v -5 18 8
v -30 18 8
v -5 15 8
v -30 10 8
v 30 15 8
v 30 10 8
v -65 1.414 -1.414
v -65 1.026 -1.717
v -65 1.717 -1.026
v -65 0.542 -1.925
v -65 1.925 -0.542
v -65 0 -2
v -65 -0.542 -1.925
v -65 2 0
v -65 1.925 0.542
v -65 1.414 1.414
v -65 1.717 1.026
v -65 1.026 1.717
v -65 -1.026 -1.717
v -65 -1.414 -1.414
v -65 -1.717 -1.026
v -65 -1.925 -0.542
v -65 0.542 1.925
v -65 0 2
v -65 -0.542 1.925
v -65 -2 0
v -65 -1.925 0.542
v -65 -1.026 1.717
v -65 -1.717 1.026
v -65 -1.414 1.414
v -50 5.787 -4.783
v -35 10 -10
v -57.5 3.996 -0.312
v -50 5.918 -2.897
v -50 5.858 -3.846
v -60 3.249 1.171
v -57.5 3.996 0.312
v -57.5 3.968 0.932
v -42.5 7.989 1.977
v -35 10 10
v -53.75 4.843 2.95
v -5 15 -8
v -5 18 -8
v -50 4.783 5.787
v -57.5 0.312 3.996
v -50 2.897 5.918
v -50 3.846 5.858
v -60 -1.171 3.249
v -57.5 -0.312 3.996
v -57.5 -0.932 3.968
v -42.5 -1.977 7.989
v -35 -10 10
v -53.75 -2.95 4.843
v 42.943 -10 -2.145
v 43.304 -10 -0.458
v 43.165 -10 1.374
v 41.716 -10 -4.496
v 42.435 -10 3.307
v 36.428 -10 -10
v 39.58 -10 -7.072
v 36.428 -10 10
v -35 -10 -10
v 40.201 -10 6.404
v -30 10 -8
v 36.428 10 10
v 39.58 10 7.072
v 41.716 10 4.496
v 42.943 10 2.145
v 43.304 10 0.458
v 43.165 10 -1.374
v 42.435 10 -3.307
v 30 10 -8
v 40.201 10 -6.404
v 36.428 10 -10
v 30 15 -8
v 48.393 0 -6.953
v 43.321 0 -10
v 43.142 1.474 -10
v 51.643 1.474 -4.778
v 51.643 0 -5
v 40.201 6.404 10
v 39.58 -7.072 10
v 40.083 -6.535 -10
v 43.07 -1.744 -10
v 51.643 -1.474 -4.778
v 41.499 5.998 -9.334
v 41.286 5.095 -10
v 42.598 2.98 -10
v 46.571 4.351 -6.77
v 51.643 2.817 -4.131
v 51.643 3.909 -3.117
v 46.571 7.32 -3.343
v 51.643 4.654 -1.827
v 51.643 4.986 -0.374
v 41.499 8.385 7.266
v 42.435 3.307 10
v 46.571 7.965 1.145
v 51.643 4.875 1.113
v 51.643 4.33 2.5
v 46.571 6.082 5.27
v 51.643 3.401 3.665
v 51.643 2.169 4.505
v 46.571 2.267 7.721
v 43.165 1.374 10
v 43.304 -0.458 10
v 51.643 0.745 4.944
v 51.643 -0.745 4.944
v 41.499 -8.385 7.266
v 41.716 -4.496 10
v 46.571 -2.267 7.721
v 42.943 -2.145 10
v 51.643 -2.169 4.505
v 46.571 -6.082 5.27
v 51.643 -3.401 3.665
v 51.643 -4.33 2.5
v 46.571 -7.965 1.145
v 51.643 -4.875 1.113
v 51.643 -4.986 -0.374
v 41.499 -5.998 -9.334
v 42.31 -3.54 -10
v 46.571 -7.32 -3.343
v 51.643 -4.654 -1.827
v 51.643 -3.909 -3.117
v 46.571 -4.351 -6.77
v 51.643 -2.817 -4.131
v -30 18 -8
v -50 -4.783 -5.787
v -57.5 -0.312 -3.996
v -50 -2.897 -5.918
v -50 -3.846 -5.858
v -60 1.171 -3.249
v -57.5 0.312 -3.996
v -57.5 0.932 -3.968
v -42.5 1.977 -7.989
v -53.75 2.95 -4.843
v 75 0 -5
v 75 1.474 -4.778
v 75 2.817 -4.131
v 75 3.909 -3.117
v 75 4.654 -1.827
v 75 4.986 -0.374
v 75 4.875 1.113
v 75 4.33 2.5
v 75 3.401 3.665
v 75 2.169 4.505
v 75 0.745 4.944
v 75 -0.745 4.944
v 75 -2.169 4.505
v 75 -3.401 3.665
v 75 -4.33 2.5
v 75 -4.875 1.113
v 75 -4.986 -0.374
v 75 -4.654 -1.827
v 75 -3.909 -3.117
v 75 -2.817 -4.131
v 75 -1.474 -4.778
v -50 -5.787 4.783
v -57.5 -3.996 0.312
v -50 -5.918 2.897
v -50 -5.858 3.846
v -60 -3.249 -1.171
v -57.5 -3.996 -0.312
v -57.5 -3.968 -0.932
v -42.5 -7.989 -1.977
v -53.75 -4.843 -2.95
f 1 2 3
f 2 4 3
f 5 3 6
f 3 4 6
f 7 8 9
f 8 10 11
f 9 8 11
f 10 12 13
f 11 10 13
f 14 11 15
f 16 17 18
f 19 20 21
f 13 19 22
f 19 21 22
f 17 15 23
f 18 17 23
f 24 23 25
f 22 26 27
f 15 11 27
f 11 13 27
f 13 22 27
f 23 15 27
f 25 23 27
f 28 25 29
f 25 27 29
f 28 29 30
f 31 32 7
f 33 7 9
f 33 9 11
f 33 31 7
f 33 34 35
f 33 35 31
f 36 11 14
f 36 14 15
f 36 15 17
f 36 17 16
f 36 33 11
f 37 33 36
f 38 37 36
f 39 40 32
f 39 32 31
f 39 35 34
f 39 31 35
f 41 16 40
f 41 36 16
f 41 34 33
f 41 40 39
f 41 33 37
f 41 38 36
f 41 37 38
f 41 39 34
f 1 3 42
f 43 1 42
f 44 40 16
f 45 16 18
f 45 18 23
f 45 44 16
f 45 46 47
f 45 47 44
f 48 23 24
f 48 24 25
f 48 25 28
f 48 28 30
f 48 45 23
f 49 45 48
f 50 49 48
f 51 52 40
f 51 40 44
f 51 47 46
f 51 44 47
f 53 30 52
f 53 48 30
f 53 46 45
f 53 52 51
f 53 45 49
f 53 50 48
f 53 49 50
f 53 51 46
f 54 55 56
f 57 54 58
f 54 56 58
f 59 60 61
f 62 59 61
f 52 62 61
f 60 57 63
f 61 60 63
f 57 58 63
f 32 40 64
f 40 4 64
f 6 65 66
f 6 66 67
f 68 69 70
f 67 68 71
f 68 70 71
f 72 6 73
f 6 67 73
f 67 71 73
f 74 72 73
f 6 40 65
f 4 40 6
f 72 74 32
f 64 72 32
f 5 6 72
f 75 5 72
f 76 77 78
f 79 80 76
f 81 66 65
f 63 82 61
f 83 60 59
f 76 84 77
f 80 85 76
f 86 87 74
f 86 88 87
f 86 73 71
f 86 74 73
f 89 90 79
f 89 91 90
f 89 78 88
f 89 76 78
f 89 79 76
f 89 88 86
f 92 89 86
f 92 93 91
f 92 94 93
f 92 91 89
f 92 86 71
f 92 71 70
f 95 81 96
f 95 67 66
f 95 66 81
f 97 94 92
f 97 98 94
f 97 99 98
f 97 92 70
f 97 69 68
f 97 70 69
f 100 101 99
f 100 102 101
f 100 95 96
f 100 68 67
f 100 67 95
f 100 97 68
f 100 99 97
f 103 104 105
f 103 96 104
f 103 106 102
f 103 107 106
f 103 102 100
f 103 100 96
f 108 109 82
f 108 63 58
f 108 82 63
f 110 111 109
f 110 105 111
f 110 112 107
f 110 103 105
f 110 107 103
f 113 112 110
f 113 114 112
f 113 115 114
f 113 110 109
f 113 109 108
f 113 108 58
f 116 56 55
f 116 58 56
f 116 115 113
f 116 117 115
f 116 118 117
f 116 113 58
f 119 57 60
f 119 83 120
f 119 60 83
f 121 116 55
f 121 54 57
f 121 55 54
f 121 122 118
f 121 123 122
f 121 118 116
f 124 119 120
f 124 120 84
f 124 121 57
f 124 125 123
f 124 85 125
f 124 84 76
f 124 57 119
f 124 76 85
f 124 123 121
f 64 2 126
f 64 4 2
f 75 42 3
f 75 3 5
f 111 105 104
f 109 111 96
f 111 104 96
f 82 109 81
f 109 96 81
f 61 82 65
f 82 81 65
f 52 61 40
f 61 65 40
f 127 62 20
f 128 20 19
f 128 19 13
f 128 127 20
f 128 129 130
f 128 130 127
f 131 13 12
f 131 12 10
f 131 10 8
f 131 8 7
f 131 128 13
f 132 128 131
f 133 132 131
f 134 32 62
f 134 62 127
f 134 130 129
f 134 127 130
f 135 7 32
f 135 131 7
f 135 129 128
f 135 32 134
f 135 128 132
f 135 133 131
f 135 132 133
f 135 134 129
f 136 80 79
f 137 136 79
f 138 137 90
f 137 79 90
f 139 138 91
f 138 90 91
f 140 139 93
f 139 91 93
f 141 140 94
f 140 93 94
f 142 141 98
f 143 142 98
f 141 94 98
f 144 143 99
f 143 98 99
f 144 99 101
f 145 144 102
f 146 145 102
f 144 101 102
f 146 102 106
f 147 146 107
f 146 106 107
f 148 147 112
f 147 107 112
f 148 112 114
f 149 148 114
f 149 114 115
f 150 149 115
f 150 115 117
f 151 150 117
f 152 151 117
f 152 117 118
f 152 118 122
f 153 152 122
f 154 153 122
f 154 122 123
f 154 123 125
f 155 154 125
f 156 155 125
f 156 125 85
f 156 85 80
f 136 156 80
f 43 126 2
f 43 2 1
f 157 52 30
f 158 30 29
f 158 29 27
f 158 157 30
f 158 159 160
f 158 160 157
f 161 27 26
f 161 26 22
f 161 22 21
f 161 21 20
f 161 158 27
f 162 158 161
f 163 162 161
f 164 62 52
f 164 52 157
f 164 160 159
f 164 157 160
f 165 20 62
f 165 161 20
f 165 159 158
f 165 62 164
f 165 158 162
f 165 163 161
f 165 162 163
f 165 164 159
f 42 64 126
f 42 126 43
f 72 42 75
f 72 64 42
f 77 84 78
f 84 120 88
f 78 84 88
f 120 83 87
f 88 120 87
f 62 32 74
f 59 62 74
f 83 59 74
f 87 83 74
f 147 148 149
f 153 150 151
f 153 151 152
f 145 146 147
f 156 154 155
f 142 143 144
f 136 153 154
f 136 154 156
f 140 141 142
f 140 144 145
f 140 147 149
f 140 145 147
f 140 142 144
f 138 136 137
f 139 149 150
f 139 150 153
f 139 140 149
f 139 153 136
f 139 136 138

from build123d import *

# Parameters (mm, degrees)
DODANIE_WYCI_GNI_CIE1_DEPTH      = 10
DODANIE_WYCI_GNI_CIE1_DEPTH_BACK = 10
SZKIC1_W                         = 70
SZKIC1_H                         = 20
SZKIC4_R                         = 5
DODANIE_WYCI_GNI_CIE2_DEPTH      = 40
SFAZOWANIE1_SIZE                 = 10
SFAZOWANIE1_SIZE_2               = 16.642794824
SZKIC5_W                         = 60
SZKIC5_H                         = 16
DODANIE_WYCI_GNI_CIE3_DEPTH      = 5
SZKIC6_W                         = 25
SZKIC6_H                         = 16
DODANIE_WYCI_GNI_CIE4_DEPTH      = 3


with BuildPart() as part:
    # Szkic1 → Dodanie-wyciągnięcie1 (new, two sides: drawn at the far end of the back side and taken through both)
    with BuildSketch(Plane.XY.offset(-DODANIE_WYCI_GNI_CIE1_DEPTH_BACK)):
        Rectangle(SZKIC1_W, SZKIC1_H)
    extrude(amount=DODANIE_WYCI_GNI_CIE1_DEPTH + DODANIE_WYCI_GNI_CIE1_DEPTH_BACK)

    # Wyciągnięcie po profilach1: read off the stored shape, not the designer's step
    # Wyciągnięcie po profilach1: loft between two sections, ruled curve by curve
    wyci_gni_cie_po_profilach1_from = [
        Edge.make_bspline([(-65, 1.414213562, -1.414213562), (-65, 1.580880229, -1.247546896), (-65, 1.730317192, -1.037358885), (-65, 1.94065032, -0.551350505), (-65, 2, -0.276142375), (-65, 2, 0.276142375), (-65, 1.94065032, 0.551350505), (-65, 1.730317192, 1.037358885), (-65, 1.580880229, 1.247546896), (-65, 1.414213562, 1.414213562)], [0, 0, 0, 0, 0.25, 0.25, 0.5, 0.5, 0.75, 0.75, 1, 1, 1, 1], 3),
        Edge.make_bspline([(-65, 1.414213562, 1.414213562), (-65, 1.247546896, 1.580880229), (-65, 1.037358885, 1.730317192), (-65, 0.551350505, 1.94065032), (-65, 0.276142375, 2), (-65, -0.276142375, 2), (-65, -0.551350505, 1.94065032), (-65, -1.037358885, 1.730317192), (-65, -1.247546896, 1.580880229), (-65, -1.414213562, 1.414213562)], [0, 0, 0, 0, 0.25, 0.25, 0.5, 0.5, 0.75, 0.75, 1, 1, 1, 1], 3),
        Edge.make_bspline([(-65, -1.414213562, -1.414213562), (-65, -1.247546896, -1.580880229), (-65, -1.037358885, -1.730317192), (-65, -0.551350505, -1.94065032), (-65, -0.276142375, -2), (-65, 0.276142375, -2), (-65, 0.551350505, -1.94065032), (-65, 1.037358885, -1.730317192), (-65, 1.247546896, -1.580880229), (-65, 1.414213562, -1.414213562)], [0, 0, 0, 0, 0.25, 0.25, 0.5, 0.5, 0.75, 0.75, 1, 1, 1, 1], 3),
        Edge.make_bspline([(-65, -1.414213562, 1.414213562), (-65, -1.580880229, 1.247546896), (-65, -1.730317192, 1.037358885), (-65, -1.94065032, 0.551350505), (-65, -2, 0.276142375), (-65, -2, -0.276142375), (-65, -1.94065032, -0.551350505), (-65, -1.730317192, -1.037358885), (-65, -1.580880229, -1.247546896), (-65, -1.414213562, -1.414213562)], [0, 0, 0, 0, 0.25, 0.25, 0.5, 0.5, 0.75, 0.75, 1, 1, 1, 1], 3),
    ]
    wyci_gni_cie_po_profilach1_to = [
        Edge.make_bspline([(-35, 10, -10), (-35, 10, -8.333333333), (-35, 10, -6.666666667), (-35, 10, -3.333333333), (-35, 10, -1.666666667), (-35, 10, 1.666666667), (-35, 10, 3.333333333), (-35, 10, 6.666666667), (-35, 10, 8.333333333), (-35, 10, 10)], [0, 0, 0, 0, 0.25, 0.25, 0.5, 0.5, 0.75, 0.75, 1, 1, 1, 1], 3),
        Edge.make_bspline([(-35, 10, 10), (-35, 8.333333333, 10), (-35, 6.666666667, 10), (-35, 3.333333333, 10), (-35, 1.666666667, 10), (-35, -1.666666667, 10), (-35, -3.333333333, 10), (-35, -6.666666667, 10), (-35, -8.333333333, 10), (-35, -10, 10)], [0, 0, 0, 0, 0.25, 0.25, 0.5, 0.5, 0.75, 0.75, 1, 1, 1, 1], 3),
        Edge.make_bspline([(-35, -10, -10), (-35, -8.333333333, -10), (-35, -6.666666667, -10), (-35, -3.333333333, -10), (-35, -1.666666667, -10), (-35, 1.666666667, -10), (-35, 3.333333333, -10), (-35, 6.666666667, -10), (-35, 8.333333333, -10), (-35, 10, -10)], [0, 0, 0, 0, 0.25, 0.25, 0.5, 0.5, 0.75, 0.75, 1, 1, 1, 1], 3),
        Edge.make_bspline([(-35, -10, 10), (-35, -10, 8.333333333), (-35, -10, 6.666666667), (-35, -10, 3.333333333), (-35, -10, 1.666666667), (-35, -10, -1.666666667), (-35, -10, -3.333333333), (-35, -10, -6.666666667), (-35, -10, -8.333333333), (-35, -10, -10)], [0, 0, 0, 0, 0.25, 0.25, 0.5, 0.5, 0.75, 0.75, 1, 1, 1, 1], 3),
    ]
    wyci_gni_cie_po_profilach1 = Solid(Shell([*[Face.make_surface_from_curves(wyci_gni_cie_po_profilach1_from[k], wyci_gni_cie_po_profilach1_to[k]) for k in range(4)], Face(Wire(wyci_gni_cie_po_profilach1_from)), Face(Wire(wyci_gni_cie_po_profilach1_to))]))
    add(wyci_gni_cie_po_profilach1)

    # Szkic4 → Dodanie-wyciągnięcie2 (add)
    with BuildSketch(Plane(origin=(35, 0, 0), x_dir=(0, 0, -1), z_dir=(1, 0, 0))):
        Circle(SZKIC4_R)
    extrude(amount=DODANIE_WYCI_GNI_CIE2_DEPTH)

    # Sfazowanie1
    # the kernel refuses this chamfer: 16.642794824, 10 mm, written as the material it adds along each edge
    with BuildSketch(Plane(origin=(35, 0, 0), x_dir=(0, 0, -1), z_dir=(0, -1, 0))) as sfazowanie1_piece_1_section:
        Polygon((5 + SFAZOWANIE1_SIZE, 0), (5, SFAZOWANIE1_SIZE_2), (5, 0), align=None)
    sfazowanie1_piece_1 = revolve(axis=Axis((35, 0, 0), (1, 0, 0)), mode=Mode.PRIVATE)
    sfazowanie1_piece_1 = split(sfazowanie1_piece_1, bisect_by=Plane(origin=(35, 10, 0), z_dir=(0, -1, 0)), keep=Keep.TOP, mode=Mode.PRIVATE)
    sfazowanie1_piece_1 = split(sfazowanie1_piece_1, bisect_by=Plane(origin=(35, 0, 10), z_dir=(0, 0, -1)), keep=Keep.TOP, mode=Mode.PRIVATE)
    sfazowanie1_piece_1 = split(sfazowanie1_piece_1, bisect_by=Plane(origin=(35, 0, -10), z_dir=(0, 0, 1)), keep=Keep.TOP, mode=Mode.PRIVATE)
    sfazowanie1_piece_1 = split(sfazowanie1_piece_1, bisect_by=Plane(origin=(35, -10, 0), z_dir=(0, 1, 0)), keep=Keep.TOP, mode=Mode.PRIVATE)
    add(sfazowanie1_piece_1)

    # Szkic5 → Dodanie-wyciągnięcie3 (add)
    with BuildSketch(Plane(origin=(0, 10, 0), x_dir=(1, 0, 0), z_dir=(0, 1, 0))):
        Rectangle(SZKIC5_W, SZKIC5_H)
    extrude(amount=DODANIE_WYCI_GNI_CIE3_DEPTH)

    # Szkic6 → Dodanie-wyciągnięcie4 (add)
    with BuildSketch(Plane(origin=(0, 15, 0), x_dir=(1, 0, 0), z_dir=(0, 1, 0))):
        with Locations((-17.5, 0)):
            Rectangle(SZKIC6_W, SZKIC6_H)
    extrude(amount=DODANIE_WYCI_GNI_CIE4_DEPTH)


solid = part.part
